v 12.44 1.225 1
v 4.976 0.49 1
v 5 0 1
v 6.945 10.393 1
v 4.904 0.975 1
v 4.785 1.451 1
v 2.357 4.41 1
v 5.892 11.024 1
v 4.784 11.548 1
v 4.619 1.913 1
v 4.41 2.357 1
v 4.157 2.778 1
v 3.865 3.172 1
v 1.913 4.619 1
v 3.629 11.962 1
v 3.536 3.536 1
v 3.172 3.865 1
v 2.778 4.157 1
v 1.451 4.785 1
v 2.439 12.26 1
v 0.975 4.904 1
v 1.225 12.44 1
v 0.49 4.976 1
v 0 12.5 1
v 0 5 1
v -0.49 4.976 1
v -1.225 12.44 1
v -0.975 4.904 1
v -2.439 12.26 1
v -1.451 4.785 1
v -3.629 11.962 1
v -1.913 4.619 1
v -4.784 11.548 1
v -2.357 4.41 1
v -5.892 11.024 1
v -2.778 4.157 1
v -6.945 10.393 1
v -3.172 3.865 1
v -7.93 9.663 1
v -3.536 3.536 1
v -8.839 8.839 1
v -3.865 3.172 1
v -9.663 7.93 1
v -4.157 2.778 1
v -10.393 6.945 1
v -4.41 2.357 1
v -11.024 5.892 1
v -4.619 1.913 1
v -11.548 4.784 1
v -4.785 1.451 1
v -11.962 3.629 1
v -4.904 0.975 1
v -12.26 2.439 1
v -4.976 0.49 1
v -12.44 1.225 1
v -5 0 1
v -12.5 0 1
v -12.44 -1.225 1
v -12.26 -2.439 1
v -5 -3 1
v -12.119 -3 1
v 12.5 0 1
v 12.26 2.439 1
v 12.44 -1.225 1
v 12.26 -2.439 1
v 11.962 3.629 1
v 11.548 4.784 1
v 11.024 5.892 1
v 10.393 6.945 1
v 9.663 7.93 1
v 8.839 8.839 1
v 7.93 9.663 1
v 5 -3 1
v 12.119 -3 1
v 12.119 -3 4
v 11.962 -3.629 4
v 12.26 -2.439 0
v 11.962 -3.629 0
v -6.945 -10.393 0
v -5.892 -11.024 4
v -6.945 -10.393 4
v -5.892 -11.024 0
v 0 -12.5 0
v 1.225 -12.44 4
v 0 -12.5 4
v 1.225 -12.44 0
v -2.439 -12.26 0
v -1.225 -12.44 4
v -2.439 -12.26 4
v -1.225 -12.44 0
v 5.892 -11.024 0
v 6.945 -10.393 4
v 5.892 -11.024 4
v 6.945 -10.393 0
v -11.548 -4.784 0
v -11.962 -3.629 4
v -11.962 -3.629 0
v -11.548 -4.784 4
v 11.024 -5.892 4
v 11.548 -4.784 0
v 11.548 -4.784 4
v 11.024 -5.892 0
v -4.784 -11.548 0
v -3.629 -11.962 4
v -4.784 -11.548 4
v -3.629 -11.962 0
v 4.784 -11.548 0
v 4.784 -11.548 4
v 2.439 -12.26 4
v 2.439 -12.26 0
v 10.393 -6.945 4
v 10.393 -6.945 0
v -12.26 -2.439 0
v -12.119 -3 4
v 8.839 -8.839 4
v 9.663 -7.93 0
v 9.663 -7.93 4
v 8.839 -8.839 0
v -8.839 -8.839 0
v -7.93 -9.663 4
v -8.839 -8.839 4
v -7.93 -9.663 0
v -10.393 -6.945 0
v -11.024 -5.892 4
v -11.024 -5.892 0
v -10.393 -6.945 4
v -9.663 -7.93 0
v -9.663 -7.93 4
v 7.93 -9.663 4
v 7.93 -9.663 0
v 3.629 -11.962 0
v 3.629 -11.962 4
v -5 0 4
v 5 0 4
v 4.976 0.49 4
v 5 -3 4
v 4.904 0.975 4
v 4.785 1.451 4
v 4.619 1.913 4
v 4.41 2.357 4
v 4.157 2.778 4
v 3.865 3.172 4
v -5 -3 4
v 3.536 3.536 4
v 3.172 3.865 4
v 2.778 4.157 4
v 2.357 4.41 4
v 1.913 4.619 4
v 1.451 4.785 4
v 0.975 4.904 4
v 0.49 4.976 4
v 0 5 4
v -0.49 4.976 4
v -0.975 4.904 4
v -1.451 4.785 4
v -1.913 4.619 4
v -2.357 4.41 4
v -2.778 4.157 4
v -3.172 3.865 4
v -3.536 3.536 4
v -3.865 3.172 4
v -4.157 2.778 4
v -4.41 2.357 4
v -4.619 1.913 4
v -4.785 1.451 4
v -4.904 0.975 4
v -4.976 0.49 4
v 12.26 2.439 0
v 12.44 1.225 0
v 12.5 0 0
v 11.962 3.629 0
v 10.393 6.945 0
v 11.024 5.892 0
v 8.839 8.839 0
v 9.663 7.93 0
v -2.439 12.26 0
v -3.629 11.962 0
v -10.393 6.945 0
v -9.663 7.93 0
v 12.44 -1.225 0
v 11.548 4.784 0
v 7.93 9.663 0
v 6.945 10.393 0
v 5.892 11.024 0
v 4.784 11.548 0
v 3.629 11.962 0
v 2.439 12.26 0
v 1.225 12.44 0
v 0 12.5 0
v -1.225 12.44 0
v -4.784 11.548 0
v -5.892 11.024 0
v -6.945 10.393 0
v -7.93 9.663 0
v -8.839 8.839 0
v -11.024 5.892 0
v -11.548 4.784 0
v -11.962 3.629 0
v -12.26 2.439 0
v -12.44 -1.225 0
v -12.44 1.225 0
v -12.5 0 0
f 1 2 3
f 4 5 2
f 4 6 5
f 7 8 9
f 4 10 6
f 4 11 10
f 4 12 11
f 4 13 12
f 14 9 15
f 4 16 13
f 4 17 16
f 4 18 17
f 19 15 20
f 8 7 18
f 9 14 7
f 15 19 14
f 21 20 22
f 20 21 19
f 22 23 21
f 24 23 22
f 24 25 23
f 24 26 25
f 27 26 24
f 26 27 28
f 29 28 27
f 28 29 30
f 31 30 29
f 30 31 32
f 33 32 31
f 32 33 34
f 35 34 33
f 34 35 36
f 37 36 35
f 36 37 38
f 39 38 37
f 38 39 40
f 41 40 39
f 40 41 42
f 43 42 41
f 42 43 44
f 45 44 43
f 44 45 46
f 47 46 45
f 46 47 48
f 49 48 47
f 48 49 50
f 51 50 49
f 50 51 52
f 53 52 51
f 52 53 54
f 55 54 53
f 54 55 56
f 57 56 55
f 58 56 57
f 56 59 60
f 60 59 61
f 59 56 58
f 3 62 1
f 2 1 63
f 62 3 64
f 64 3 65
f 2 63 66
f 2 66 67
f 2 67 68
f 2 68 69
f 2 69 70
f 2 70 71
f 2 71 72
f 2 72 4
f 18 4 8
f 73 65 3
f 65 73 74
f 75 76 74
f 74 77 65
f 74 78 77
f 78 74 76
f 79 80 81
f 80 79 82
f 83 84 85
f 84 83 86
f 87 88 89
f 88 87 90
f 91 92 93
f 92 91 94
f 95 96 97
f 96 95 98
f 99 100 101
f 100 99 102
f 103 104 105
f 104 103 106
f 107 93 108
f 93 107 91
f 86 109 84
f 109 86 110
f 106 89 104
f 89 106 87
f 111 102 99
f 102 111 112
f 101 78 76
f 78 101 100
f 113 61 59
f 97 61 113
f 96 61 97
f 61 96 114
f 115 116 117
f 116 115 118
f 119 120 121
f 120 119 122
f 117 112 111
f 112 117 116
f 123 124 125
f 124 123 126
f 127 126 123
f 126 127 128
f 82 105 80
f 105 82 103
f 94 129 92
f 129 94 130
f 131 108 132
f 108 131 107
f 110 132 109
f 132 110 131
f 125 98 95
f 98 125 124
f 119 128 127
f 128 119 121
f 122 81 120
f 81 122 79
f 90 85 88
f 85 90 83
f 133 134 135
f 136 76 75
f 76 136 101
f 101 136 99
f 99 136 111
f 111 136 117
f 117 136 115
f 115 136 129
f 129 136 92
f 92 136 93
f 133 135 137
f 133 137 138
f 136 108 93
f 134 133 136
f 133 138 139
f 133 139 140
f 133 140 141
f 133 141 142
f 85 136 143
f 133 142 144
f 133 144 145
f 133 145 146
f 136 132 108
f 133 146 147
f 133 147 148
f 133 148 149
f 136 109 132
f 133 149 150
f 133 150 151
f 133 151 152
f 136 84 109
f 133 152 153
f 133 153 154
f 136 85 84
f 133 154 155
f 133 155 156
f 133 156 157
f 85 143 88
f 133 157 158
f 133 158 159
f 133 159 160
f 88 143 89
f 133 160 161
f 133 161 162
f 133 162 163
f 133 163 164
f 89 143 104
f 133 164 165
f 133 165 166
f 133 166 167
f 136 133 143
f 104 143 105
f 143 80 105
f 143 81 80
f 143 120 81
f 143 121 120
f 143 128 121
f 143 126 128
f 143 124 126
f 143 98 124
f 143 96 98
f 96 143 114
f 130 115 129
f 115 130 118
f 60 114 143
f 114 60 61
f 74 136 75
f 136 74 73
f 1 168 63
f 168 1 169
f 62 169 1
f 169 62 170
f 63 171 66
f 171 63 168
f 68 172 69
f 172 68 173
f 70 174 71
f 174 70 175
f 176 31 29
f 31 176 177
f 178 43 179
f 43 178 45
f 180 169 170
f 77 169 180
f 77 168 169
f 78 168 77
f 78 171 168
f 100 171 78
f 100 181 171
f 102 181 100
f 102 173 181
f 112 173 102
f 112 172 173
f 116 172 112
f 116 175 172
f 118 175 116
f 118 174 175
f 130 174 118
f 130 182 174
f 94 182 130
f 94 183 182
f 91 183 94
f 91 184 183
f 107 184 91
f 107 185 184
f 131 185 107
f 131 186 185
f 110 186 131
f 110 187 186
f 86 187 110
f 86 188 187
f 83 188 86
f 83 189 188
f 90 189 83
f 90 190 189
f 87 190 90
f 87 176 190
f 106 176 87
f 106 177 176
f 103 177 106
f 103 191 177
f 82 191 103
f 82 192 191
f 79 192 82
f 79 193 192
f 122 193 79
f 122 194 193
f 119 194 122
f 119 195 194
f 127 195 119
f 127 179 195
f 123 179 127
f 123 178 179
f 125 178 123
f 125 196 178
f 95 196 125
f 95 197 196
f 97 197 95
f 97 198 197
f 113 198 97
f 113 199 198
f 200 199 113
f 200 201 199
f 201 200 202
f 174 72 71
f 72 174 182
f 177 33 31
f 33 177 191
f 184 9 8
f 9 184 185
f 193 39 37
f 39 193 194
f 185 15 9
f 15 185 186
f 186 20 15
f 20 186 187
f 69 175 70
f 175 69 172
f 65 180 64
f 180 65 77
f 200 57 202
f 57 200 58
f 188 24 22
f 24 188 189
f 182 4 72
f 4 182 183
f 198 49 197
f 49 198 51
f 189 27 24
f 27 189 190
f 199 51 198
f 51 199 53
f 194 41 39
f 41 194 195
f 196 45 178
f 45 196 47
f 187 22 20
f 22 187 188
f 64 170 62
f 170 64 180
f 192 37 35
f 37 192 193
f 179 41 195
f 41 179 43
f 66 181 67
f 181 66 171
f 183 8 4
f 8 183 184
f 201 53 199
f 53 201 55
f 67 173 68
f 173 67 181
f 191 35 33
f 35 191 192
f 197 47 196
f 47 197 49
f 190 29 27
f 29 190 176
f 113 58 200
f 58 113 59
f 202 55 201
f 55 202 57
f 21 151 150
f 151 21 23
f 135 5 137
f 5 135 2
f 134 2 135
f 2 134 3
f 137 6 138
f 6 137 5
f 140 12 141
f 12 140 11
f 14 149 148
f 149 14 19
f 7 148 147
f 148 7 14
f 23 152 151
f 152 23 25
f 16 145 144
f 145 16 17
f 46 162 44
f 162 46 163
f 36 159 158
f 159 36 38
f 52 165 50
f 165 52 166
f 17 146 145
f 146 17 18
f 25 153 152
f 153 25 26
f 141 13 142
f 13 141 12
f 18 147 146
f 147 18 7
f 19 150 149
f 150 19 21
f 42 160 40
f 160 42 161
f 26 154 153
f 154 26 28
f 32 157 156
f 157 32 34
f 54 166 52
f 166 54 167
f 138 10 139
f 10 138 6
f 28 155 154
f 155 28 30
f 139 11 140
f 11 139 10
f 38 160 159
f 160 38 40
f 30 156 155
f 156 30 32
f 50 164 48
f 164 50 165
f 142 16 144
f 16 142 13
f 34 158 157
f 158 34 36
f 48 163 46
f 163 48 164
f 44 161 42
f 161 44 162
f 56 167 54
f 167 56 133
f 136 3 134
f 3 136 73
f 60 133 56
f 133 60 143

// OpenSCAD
$fn=64;
corner_radius=5;
height=3;
plate_height=1;
plate_length=44;
plate_width=29.3;
wall_thickness=5;

rotator_diameter=25;
rotator_base_height=1;
rotator_top_height=3;
rotator_top_diameter=10;
handle_space=3;

wing_length=5;
wing_width=3;

diff=0.1;

cylinder(h=rotator_base_height, d=rotator_diameter);
translate([0,0,rotator_base_height]) cylinder(h=rotator_top_height,d=rotator_top_diameter);
translate([0,0,rotator_base_height]) difference() {
    cylinder(h=rotator_top_height,d=rotator_diameter);
    translate([-rotator_diameter/2-diff,-handle_space,0]) cube(rotator_diameter+2*diff);
}
translate([-rotator_top_diameter/2,-handle_space,rotator_base_height]) cube([rotator_top_diameter,handle_space,rotator_top_height]);
